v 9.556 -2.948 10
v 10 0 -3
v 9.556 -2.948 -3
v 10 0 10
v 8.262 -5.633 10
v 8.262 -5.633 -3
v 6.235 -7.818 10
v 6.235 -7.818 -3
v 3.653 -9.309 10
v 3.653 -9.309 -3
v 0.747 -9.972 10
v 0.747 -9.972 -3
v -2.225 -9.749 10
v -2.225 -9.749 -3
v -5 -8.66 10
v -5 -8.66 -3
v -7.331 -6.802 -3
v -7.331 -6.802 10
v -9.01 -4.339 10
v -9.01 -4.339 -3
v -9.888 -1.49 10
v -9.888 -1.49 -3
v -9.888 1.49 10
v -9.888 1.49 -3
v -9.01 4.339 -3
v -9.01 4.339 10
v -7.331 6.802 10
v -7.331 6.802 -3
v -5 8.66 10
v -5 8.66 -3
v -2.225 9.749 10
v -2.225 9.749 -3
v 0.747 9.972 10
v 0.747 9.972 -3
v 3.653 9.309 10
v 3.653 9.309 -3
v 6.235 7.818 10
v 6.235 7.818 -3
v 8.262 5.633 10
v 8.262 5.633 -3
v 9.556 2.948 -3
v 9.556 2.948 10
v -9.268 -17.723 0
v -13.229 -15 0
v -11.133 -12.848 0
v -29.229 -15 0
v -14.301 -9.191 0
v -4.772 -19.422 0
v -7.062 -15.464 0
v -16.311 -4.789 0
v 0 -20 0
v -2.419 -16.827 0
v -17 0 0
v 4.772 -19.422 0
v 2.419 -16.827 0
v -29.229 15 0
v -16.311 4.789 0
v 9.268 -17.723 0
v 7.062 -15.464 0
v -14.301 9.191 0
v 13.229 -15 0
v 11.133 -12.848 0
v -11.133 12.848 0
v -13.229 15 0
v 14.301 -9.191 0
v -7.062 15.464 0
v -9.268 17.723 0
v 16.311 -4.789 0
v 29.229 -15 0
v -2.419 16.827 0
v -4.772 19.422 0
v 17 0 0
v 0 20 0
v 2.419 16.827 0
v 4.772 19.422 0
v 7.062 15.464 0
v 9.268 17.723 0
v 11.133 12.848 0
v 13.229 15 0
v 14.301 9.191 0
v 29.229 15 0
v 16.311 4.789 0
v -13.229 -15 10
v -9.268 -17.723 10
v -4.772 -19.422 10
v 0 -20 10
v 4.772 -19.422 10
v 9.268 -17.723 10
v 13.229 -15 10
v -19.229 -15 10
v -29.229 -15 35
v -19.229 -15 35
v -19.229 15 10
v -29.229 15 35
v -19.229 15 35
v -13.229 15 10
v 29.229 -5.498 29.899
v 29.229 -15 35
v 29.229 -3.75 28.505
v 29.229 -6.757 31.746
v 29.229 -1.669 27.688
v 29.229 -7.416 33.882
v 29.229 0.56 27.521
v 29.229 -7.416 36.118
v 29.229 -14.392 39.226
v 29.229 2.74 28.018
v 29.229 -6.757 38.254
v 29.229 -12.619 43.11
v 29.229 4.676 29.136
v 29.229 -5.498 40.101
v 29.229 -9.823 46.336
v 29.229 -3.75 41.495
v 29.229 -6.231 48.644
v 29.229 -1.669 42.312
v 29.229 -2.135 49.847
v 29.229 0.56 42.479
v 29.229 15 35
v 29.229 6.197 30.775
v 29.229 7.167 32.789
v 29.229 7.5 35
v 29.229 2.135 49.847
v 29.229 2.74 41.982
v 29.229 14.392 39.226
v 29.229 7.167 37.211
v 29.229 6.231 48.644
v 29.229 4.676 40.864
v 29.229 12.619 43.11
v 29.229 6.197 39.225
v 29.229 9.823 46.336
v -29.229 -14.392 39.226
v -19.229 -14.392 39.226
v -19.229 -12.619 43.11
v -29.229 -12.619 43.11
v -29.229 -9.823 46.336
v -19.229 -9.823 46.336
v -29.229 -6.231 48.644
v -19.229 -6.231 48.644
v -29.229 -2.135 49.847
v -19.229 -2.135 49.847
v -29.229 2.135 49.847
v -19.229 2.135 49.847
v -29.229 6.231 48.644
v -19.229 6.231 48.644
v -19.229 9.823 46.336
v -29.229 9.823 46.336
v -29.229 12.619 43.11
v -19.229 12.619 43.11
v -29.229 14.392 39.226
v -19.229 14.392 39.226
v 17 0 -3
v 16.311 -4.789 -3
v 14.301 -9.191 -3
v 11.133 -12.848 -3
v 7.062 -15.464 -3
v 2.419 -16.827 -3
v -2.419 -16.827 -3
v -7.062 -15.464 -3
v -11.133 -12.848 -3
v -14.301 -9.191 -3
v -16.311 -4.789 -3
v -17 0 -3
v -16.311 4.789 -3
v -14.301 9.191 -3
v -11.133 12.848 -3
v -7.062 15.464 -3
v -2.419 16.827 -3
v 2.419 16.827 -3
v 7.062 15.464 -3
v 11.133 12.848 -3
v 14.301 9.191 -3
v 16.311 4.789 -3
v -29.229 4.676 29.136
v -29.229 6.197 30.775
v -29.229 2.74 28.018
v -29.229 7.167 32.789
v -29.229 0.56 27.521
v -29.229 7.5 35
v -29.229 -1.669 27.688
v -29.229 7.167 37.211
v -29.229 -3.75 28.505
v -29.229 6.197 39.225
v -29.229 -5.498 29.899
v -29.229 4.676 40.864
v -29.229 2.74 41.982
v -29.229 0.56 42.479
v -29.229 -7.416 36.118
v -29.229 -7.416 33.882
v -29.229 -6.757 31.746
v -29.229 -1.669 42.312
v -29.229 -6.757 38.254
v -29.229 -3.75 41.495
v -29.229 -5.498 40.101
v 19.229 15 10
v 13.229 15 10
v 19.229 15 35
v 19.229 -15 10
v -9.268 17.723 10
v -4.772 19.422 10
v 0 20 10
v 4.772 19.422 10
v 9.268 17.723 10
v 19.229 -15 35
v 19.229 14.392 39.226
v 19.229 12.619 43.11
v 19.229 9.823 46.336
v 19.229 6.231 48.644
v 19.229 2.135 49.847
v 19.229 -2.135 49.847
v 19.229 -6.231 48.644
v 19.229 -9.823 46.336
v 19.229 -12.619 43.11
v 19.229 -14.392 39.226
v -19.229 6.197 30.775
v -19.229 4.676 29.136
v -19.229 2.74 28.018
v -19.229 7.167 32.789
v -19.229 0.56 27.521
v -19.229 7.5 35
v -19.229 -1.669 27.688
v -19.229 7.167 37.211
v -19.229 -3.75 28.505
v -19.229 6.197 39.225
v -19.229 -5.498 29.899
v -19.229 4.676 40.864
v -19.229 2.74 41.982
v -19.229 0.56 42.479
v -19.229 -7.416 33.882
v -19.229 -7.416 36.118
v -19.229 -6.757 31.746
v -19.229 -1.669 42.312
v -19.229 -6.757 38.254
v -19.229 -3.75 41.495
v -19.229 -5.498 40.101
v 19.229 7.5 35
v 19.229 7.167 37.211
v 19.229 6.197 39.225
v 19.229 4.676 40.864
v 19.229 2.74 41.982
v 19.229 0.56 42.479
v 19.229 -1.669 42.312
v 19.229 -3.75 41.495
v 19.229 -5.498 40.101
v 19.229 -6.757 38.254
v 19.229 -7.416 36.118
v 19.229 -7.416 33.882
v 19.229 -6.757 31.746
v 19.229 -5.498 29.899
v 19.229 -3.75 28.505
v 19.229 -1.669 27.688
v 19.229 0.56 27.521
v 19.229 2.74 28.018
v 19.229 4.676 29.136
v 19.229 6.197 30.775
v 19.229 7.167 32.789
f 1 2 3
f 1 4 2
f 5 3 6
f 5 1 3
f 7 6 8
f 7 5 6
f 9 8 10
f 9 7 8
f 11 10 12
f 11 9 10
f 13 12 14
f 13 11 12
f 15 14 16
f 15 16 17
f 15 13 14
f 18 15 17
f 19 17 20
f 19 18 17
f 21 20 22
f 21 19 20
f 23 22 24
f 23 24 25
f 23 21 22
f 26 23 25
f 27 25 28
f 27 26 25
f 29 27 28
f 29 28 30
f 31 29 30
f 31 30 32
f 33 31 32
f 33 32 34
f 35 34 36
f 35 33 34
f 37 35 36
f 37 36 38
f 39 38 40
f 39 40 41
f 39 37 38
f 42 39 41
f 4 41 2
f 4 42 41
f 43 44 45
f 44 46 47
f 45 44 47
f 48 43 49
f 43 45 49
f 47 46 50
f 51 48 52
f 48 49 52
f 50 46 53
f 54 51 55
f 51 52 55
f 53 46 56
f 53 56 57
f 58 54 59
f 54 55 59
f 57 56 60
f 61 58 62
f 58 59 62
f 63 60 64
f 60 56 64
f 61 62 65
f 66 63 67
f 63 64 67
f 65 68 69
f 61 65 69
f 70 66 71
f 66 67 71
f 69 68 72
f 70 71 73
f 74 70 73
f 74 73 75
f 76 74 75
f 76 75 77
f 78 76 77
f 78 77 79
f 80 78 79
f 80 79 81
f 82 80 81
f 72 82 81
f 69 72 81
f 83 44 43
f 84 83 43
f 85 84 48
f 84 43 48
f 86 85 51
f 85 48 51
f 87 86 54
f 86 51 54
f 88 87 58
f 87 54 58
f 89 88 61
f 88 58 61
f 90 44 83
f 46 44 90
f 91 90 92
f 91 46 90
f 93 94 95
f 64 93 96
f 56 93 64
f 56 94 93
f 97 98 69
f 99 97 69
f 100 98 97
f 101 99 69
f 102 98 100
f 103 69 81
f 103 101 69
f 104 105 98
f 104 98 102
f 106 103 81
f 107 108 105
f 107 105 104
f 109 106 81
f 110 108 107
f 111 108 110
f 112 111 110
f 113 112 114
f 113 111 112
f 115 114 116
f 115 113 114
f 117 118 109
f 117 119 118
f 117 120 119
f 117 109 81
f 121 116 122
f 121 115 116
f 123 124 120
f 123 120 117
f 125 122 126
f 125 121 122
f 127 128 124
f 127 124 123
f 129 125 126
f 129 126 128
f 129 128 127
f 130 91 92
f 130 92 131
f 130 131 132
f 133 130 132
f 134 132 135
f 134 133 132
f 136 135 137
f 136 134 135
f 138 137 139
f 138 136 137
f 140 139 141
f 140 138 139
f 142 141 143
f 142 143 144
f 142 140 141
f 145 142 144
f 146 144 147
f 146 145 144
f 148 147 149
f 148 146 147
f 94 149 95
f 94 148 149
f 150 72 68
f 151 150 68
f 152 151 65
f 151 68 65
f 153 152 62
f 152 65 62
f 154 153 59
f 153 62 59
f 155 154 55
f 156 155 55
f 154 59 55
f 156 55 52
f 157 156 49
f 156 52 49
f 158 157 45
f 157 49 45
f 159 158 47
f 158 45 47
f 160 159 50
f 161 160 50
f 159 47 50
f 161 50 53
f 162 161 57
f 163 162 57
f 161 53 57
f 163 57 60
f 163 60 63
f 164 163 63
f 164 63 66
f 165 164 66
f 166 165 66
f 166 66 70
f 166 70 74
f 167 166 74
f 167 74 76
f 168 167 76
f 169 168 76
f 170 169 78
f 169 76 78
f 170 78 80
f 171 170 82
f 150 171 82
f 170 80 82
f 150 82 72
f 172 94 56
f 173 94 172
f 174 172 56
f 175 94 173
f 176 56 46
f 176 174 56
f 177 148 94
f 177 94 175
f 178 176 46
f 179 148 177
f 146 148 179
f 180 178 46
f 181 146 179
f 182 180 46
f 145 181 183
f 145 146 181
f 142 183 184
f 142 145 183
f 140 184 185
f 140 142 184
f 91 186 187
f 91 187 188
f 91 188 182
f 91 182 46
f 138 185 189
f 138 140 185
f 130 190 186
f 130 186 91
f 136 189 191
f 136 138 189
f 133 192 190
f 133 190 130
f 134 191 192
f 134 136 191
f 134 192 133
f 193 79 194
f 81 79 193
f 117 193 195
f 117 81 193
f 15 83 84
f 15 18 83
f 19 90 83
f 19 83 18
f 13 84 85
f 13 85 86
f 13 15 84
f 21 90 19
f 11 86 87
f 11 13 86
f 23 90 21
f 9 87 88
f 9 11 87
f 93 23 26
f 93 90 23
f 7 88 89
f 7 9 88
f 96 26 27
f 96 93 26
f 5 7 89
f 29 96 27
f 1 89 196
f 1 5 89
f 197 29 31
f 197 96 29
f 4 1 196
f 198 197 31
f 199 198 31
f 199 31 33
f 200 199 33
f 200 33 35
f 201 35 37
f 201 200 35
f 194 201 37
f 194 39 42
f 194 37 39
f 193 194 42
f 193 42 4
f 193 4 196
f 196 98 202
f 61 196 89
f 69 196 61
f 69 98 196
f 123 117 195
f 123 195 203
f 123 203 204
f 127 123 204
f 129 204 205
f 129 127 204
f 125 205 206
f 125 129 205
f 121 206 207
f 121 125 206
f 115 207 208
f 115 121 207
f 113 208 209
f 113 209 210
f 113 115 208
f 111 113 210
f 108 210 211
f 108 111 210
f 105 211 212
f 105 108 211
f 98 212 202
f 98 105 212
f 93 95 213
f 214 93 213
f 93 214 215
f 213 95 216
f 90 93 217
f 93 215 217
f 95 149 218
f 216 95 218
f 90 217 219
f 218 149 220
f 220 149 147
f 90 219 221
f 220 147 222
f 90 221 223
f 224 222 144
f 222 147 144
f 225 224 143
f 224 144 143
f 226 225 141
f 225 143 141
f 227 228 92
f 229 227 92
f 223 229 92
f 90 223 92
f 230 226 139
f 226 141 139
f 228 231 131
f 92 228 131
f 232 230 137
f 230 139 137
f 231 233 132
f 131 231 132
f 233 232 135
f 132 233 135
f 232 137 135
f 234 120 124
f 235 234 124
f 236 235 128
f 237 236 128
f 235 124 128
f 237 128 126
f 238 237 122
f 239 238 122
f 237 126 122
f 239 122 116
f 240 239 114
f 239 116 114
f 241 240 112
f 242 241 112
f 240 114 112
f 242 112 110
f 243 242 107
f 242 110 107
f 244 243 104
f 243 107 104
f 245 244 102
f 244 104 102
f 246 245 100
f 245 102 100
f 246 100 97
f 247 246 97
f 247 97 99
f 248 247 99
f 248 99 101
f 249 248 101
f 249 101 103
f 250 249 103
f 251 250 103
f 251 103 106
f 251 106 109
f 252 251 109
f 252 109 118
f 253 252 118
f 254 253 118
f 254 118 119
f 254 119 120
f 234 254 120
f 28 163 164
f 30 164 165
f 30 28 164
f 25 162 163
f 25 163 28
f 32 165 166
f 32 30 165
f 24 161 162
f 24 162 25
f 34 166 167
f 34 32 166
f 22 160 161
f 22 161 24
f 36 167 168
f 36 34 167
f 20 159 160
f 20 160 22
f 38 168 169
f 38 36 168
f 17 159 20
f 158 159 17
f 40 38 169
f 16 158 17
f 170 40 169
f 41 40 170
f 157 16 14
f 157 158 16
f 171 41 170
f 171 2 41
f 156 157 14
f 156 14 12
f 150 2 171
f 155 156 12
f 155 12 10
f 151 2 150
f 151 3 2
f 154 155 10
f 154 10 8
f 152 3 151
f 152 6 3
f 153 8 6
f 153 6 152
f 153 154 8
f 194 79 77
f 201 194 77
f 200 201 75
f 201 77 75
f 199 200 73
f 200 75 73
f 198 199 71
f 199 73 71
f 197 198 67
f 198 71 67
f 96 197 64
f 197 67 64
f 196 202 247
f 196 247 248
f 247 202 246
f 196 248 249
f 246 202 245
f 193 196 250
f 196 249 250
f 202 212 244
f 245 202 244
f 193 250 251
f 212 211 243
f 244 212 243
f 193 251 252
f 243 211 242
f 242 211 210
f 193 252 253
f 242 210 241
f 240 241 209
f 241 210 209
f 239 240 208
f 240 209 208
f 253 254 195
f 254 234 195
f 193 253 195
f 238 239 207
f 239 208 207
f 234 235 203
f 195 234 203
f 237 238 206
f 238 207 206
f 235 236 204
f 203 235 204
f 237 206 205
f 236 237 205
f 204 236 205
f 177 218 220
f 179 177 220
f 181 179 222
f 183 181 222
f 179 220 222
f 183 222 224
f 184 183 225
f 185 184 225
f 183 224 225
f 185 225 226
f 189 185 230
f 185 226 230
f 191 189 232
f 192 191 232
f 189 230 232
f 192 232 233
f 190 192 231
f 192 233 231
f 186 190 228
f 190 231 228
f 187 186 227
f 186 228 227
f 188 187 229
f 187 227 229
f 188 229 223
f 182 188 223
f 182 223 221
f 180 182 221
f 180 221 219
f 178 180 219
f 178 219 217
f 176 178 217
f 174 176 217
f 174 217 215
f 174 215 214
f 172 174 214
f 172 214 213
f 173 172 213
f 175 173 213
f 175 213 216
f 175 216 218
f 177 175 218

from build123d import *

# Parameters (mm, degrees)
F1_DEPTH  = 10
F3_DEPTH  = 10
F5_DEPTH  = 10
F6_R      = 10
F7_DEPTH  = 10.001
F8_R      = 17
F8_R_2    = 10
F9_DEPTH  = 3
F10_R     = 7.5
F11_DEPTH = 58.4585131106


with BuildPart() as f1:
    # F0 (on Top) → F1 (new body)
    with BuildSketch(Plane.XY):
        with BuildLine():
            Line((-29.2287565553, 15), (-29.2287565553, -15))
            Line((-29.2287565553, -15), (-13.2287565553, -15))
            ThreePointArc((-13.2287565553, -15), (0, -20), (13.2287565553, -15))
            Line((13.2287565553, -15), (29.2287565553, -15))
            Line((29.2287565553, -15), (29.2287565553, 15))
            Line((29.2287565553, 15), (13.2287565553, 15))
            ThreePointArc((13.2287565553, 15), (0, 20), (-13.2287565553, 15))
            Line((-13.2287565553, 15), (-29.2287565553, 15))
        make_face()
    extrude(amount=F1_DEPTH)

    # F2 (on face) → F3 (join)
    with BuildSketch(Plane.YZ.offset(29.2287565553)):
        with BuildLine():
            Line((-15, 35), (-15, 10))
            Line((-15, 10), (15, 10))
            Line((15, 10), (15, 35))
            ThreePointArc((15, 35), (0, 50), (-15, 35))
        make_face()
    extrude(amount=-F3_DEPTH)

    # F4 (on face) → F5 (join)
    with BuildSketch(Plane(origin=(-29.2287565553, 0, 0), x_dir=(0, -1, 0), z_dir=(-1, 0, 0))):
        with BuildLine():
            Line((-15, 35), (-15, 10))
            Line((-15, 10), (15, 10))
            Line((15, 10), (15, 35))
            ThreePointArc((15, 35), (0, 50), (-15, 35))
        make_face()
    extrude(amount=-F5_DEPTH)

    # F6 (on face) → F7 (cut, through all)
    with BuildSketch(Plane.XY.offset(10)):
        Circle(F6_R)
    extrude(amount=-F7_DEPTH, mode=Mode.SUBTRACT)

    # F8 (on face) → F9 (join)
    with BuildSketch(Plane(origin=(0, 0, 0), x_dir=(1, 0, 0), z_dir=(0, 0, -1))):
        Circle(F8_R)
        Circle(F8_R_2, mode=Mode.SUBTRACT)
    extrude(amount=F9_DEPTH)

    # F10 (on face) → F11 (cut, through all)
    with BuildSketch(Plane.YZ.offset(29.2287565553)):
        with Locations((0, 35)):
            Circle(F10_R)
    extrude(amount=-F11_DEPTH, mode=Mode.SUBTRACT)


solid = f1.part
